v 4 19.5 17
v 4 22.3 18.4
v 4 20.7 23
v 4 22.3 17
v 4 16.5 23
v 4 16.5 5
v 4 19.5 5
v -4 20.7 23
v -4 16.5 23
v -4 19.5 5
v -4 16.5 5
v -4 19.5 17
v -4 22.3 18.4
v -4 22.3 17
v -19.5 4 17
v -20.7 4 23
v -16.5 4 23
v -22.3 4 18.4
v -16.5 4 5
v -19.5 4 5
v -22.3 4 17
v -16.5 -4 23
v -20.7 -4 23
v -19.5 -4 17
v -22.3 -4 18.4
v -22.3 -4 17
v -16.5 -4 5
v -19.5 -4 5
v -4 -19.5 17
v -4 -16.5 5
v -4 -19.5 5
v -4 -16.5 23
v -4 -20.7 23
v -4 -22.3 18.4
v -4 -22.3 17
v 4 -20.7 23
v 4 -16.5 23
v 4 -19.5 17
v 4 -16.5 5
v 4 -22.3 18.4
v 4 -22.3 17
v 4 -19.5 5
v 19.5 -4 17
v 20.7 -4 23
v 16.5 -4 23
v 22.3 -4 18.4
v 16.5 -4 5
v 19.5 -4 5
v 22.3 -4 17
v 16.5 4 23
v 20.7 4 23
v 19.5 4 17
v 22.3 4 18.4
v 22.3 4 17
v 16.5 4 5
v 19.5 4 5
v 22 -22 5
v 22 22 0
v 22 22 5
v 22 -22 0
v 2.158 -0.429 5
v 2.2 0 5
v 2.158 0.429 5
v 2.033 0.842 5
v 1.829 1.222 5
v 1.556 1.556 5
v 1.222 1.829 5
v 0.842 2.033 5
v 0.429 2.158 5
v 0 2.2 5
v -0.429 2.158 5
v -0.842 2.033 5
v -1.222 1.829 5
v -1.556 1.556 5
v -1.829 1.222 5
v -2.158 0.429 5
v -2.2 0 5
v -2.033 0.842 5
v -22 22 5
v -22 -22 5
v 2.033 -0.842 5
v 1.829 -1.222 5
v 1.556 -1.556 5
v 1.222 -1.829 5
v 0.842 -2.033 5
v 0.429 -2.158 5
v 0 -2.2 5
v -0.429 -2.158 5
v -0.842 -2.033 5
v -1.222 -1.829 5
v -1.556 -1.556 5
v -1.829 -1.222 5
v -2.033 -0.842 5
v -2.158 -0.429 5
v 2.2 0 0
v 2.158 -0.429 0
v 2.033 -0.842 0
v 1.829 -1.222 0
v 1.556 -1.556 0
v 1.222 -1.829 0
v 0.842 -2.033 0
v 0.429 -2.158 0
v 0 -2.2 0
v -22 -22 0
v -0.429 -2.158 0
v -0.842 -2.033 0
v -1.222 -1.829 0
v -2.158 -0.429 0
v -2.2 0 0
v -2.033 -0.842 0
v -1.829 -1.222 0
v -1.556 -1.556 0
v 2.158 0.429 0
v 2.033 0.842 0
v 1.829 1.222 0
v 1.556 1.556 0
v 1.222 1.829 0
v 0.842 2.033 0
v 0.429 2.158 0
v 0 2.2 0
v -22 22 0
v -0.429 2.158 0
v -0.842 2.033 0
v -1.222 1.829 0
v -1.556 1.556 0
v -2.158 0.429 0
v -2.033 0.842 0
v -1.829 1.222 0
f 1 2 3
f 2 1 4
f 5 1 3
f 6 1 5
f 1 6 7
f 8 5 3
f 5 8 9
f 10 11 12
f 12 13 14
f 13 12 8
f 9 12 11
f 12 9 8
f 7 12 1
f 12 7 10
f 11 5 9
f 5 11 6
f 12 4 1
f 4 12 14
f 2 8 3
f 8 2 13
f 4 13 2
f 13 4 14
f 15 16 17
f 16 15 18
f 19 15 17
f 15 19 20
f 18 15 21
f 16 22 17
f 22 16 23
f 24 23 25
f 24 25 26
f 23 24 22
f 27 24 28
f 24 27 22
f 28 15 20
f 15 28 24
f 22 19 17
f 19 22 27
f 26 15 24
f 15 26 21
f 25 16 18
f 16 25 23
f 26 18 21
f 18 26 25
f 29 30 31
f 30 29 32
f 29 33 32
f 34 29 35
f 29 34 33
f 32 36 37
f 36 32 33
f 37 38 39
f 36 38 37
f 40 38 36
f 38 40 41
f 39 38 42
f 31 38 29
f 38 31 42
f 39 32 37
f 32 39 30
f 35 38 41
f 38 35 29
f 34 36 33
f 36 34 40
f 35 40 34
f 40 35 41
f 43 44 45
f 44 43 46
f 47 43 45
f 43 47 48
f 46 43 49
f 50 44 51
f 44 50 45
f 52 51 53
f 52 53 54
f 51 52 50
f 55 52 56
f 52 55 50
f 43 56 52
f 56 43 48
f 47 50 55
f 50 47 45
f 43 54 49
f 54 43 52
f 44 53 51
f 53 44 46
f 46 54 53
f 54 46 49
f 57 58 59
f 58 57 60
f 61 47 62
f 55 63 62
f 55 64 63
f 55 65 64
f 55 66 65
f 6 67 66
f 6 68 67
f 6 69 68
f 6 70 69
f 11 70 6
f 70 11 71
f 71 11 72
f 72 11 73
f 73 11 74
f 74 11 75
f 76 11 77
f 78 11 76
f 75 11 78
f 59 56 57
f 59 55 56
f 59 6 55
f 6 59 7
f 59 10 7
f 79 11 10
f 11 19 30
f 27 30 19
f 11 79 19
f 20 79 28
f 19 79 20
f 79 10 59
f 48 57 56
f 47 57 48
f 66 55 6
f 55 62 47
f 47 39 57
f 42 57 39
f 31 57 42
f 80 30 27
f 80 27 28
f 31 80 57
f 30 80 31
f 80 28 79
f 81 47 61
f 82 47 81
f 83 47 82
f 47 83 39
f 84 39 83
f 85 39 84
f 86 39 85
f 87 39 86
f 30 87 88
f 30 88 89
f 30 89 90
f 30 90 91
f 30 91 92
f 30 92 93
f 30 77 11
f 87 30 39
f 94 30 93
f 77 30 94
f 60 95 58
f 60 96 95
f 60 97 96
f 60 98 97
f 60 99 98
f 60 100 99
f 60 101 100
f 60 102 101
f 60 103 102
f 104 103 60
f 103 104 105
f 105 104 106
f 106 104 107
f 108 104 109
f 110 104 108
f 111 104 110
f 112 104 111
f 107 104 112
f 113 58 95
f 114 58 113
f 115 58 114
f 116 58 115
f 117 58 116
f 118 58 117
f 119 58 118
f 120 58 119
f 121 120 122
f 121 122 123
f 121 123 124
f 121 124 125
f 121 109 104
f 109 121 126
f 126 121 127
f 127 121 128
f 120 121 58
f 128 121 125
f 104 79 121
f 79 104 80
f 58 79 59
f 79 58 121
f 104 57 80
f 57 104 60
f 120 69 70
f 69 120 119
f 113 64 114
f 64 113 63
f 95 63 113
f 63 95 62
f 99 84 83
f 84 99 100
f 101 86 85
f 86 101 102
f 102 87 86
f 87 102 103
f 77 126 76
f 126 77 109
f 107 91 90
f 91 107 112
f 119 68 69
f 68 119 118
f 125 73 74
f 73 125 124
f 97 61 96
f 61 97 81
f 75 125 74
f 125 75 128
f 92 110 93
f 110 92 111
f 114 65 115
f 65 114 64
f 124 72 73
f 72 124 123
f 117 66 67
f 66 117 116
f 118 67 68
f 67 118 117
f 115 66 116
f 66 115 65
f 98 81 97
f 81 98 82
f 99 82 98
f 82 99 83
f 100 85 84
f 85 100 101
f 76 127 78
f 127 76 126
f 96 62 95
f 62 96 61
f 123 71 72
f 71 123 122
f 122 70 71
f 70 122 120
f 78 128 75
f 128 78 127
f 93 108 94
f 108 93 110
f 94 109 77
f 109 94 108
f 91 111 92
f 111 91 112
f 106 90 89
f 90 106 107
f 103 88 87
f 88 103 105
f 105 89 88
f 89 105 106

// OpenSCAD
$fn = 32;

// ----------------------------------------------------------------------
// Snap-fit latch: 4 arms, 18 mm tall, 3 mm undercut hooks
// ----------------------------------------------------------------------

// --- parameters (mm) ---
base_d = 44;              // base plate depth
base_h = 5;               // base plate thickness
span = 36;                // distance between opposite arms
arm_t = 3;                // arm thickness
arm_d = 8;                // arm width
height = 18;              // free arm length
head_len = 3;             // hook reach
head_h = 6;               // hook height
lead = 1.4;               // lead-in ramp thickness
bore_d = 4.4;             // base fixing bore
top_z = 23;               // height of the arm tips above the base

arms = 4;

difference() {
  union() {
    /* base plate, centred on the arm ring */
    translate([-22, -22, 0]) cube([base_d, base_d, base_h]);
    for (a = [0 : 360 / arms : 359]) rotate([0, 0, a]) {
    /* arm, sunk 0.5 mm into the base */
    translate([-arm_d / 2, span / 2 - arm_t / 2, base_h - 0.5]) cube([arm_d, arm_t, height + 0.5]);
    /* hook: a convex hull of a tall inner block and a thin outer lip
       gives a flat undercut below and a lead-in ramp on top */
    hull() {
      translate([-arm_d / 2, span / 2 + arm_t / 2 - 0.6, top_z - head_h]) cube([arm_d, lead + 0.4, head_h]);
      translate([-arm_d / 2, span / 2 + arm_t / 2 - 0.2, top_z - head_h]) cube([arm_d, head_len, lead]);
    }
    }
  }
  translate([0, 0, -2.5]) cylinder(h = base_h + 5, d = bore_d);
}
